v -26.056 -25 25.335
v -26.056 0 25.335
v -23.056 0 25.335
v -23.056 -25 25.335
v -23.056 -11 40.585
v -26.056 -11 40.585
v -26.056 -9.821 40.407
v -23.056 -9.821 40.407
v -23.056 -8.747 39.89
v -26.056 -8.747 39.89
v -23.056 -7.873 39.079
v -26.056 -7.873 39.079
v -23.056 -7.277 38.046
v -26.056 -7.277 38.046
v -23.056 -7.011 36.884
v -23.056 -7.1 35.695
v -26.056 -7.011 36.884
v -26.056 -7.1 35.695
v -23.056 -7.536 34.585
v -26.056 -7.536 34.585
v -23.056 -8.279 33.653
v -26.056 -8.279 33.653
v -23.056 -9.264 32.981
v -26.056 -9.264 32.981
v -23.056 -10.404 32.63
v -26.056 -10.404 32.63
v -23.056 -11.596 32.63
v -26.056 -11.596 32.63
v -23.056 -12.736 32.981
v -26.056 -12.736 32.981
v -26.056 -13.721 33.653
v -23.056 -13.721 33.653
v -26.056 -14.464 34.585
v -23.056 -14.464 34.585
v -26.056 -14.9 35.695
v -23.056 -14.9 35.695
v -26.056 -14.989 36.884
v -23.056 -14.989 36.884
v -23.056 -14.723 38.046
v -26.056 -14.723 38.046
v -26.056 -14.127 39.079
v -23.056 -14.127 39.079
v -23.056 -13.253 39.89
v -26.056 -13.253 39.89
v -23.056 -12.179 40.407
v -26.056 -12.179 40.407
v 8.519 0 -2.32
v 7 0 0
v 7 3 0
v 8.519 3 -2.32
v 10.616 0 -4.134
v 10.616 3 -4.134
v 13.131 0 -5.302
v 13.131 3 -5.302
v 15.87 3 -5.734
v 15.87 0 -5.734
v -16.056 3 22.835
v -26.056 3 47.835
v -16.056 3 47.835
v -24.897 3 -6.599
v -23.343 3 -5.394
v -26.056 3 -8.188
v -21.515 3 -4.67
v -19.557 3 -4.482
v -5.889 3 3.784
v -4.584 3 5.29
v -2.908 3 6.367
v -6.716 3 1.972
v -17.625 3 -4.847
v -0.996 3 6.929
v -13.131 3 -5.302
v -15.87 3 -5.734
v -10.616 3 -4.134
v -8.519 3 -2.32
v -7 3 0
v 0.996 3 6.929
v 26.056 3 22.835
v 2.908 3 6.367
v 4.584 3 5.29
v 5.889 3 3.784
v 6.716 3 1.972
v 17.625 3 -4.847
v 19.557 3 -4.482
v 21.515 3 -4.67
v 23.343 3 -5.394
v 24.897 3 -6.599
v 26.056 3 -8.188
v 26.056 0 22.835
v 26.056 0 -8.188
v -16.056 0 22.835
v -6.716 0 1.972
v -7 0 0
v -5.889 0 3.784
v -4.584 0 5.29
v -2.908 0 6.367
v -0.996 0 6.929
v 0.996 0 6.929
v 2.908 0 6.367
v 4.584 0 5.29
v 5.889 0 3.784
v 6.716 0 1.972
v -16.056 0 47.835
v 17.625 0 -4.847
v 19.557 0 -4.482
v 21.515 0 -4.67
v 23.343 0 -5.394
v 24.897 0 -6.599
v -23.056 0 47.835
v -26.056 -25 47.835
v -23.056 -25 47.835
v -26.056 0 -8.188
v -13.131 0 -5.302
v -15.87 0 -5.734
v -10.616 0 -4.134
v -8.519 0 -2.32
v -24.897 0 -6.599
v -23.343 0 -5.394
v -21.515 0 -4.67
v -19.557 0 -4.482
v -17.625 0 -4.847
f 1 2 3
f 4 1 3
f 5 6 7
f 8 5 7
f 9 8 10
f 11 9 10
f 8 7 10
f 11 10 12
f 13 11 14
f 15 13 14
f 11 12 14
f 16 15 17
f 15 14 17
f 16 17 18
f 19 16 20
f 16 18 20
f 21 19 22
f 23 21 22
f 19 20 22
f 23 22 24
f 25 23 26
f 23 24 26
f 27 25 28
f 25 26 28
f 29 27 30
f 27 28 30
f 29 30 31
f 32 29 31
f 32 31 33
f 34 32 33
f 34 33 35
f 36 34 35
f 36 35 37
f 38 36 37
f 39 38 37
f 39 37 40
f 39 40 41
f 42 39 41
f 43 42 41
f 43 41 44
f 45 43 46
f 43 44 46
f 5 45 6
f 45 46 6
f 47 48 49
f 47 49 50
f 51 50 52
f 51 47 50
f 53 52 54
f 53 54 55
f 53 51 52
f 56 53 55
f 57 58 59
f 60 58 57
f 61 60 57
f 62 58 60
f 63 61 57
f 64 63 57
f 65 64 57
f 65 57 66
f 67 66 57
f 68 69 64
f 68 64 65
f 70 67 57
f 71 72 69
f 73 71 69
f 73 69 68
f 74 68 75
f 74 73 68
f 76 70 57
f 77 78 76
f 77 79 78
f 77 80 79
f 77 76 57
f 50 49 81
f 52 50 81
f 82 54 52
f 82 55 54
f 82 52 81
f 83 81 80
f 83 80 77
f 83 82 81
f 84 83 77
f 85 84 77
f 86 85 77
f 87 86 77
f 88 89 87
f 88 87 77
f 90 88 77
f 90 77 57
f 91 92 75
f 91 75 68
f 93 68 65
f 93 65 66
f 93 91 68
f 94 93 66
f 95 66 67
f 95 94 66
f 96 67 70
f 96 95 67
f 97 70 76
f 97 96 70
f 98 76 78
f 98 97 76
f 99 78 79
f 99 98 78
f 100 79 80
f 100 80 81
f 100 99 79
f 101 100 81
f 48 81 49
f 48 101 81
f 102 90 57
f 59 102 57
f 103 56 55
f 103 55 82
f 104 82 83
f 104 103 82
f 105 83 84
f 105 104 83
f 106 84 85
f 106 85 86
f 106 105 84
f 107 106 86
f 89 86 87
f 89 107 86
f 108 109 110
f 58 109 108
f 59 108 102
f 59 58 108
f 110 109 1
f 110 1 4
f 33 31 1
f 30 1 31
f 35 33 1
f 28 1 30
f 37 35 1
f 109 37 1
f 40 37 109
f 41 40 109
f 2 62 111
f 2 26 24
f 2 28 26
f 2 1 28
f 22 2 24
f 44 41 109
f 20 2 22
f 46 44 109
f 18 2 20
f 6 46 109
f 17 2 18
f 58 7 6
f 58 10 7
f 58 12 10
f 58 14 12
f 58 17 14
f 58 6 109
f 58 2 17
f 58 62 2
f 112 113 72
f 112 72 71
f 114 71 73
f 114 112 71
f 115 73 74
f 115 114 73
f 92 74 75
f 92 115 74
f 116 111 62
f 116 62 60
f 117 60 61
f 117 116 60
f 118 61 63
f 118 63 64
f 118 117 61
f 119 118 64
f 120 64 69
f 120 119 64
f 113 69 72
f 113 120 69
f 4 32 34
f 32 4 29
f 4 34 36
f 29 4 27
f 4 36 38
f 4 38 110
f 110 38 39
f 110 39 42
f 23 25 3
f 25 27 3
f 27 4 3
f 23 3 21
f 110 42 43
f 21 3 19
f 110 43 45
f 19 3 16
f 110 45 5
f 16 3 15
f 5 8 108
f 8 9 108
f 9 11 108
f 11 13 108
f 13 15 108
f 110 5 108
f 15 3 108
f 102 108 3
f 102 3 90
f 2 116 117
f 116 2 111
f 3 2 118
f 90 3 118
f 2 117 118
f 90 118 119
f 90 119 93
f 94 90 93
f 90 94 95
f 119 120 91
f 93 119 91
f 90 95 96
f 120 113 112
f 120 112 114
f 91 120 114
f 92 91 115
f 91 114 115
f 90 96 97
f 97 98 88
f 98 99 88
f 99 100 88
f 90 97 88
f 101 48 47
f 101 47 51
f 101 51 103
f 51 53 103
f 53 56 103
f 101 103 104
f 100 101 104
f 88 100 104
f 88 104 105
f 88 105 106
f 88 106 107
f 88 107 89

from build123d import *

# Parameters (mm, degrees)
BOSS_EXTRUDE1_DEPTH = 3
SKETCH3_W           = 10
SKETCH3_H           = 3
BOSS_EXTRUDE2_DEPTH = 25
SKETCH4_W           = 3
SKETCH4_H           = 22.5
BOSS_EXTRUDE3_DEPTH = 25
SKETCH5_R           = 4
CUT_EXTRUDE1_DEPTH  = 3


with BuildPart() as part:
    # Sketch2 → Boss-Extrude1 (new body)
    with BuildSketch(Plane(origin=(0, 0, 0), x_dir=(1, 0, 0), z_dir=(0, 1, 0))):
        with BuildLine():
            Line((26.055569119, 8.188046441), (26.055569119, -22.834953559))
            Line((26.055569119, -22.834953559), (-26.055569119, -22.834953559))
            Line((-26.055569119, -22.834953559), (-26.055569119, 8.188046441))
            ThreePointArc((-26.055569119, 8.188046441), (-21.514872246, 4.669726518), (-15.870079226, 5.73406431))
            ThreePointArc((-15.870079226, 5.73406431), (-10.616247764, 4.133629141), (-7, 0))
            ThreePointArc((-7, 0), (0, -7), (7, 0))
            ThreePointArc((7, 0), (10.616247764, 4.133629141), (15.870079226, 5.73406431))
            ThreePointArc((15.870079226, 5.73406431), (21.514872246, 4.669726518), (26.055569119, 8.188046441))
        make_face()
    extrude(amount=BOSS_EXTRUDE1_DEPTH)

    # Sketch3 → Boss-Extrude2 (add)
    with BuildSketch(Plane.XY.offset(22.834953559)):
        with Locations((-21.055569119, 1.5)):
            Rectangle(SKETCH3_W, SKETCH3_H)
    extrude(amount=BOSS_EXTRUDE2_DEPTH)

    # Sketch4 → Boss-Extrude3 (add)
    with BuildSketch(Plane.XZ):
        with Locations((-24.555569119, 36.584953559)):
            Rectangle(SKETCH4_W, SKETCH4_H)
    extrude(amount=BOSS_EXTRUDE3_DEPTH)

    # Sketch5 → Cut-Extrude1 (cut)
    with BuildSketch(Plane.ZY.offset(26.055569119)):
        with Locations((36.584953559, -11)):
            Circle(SKETCH5_R)
    extrude(amount=-CUT_EXTRUDE1_DEPTH, mode=Mode.SUBTRACT)


solid = part.part
